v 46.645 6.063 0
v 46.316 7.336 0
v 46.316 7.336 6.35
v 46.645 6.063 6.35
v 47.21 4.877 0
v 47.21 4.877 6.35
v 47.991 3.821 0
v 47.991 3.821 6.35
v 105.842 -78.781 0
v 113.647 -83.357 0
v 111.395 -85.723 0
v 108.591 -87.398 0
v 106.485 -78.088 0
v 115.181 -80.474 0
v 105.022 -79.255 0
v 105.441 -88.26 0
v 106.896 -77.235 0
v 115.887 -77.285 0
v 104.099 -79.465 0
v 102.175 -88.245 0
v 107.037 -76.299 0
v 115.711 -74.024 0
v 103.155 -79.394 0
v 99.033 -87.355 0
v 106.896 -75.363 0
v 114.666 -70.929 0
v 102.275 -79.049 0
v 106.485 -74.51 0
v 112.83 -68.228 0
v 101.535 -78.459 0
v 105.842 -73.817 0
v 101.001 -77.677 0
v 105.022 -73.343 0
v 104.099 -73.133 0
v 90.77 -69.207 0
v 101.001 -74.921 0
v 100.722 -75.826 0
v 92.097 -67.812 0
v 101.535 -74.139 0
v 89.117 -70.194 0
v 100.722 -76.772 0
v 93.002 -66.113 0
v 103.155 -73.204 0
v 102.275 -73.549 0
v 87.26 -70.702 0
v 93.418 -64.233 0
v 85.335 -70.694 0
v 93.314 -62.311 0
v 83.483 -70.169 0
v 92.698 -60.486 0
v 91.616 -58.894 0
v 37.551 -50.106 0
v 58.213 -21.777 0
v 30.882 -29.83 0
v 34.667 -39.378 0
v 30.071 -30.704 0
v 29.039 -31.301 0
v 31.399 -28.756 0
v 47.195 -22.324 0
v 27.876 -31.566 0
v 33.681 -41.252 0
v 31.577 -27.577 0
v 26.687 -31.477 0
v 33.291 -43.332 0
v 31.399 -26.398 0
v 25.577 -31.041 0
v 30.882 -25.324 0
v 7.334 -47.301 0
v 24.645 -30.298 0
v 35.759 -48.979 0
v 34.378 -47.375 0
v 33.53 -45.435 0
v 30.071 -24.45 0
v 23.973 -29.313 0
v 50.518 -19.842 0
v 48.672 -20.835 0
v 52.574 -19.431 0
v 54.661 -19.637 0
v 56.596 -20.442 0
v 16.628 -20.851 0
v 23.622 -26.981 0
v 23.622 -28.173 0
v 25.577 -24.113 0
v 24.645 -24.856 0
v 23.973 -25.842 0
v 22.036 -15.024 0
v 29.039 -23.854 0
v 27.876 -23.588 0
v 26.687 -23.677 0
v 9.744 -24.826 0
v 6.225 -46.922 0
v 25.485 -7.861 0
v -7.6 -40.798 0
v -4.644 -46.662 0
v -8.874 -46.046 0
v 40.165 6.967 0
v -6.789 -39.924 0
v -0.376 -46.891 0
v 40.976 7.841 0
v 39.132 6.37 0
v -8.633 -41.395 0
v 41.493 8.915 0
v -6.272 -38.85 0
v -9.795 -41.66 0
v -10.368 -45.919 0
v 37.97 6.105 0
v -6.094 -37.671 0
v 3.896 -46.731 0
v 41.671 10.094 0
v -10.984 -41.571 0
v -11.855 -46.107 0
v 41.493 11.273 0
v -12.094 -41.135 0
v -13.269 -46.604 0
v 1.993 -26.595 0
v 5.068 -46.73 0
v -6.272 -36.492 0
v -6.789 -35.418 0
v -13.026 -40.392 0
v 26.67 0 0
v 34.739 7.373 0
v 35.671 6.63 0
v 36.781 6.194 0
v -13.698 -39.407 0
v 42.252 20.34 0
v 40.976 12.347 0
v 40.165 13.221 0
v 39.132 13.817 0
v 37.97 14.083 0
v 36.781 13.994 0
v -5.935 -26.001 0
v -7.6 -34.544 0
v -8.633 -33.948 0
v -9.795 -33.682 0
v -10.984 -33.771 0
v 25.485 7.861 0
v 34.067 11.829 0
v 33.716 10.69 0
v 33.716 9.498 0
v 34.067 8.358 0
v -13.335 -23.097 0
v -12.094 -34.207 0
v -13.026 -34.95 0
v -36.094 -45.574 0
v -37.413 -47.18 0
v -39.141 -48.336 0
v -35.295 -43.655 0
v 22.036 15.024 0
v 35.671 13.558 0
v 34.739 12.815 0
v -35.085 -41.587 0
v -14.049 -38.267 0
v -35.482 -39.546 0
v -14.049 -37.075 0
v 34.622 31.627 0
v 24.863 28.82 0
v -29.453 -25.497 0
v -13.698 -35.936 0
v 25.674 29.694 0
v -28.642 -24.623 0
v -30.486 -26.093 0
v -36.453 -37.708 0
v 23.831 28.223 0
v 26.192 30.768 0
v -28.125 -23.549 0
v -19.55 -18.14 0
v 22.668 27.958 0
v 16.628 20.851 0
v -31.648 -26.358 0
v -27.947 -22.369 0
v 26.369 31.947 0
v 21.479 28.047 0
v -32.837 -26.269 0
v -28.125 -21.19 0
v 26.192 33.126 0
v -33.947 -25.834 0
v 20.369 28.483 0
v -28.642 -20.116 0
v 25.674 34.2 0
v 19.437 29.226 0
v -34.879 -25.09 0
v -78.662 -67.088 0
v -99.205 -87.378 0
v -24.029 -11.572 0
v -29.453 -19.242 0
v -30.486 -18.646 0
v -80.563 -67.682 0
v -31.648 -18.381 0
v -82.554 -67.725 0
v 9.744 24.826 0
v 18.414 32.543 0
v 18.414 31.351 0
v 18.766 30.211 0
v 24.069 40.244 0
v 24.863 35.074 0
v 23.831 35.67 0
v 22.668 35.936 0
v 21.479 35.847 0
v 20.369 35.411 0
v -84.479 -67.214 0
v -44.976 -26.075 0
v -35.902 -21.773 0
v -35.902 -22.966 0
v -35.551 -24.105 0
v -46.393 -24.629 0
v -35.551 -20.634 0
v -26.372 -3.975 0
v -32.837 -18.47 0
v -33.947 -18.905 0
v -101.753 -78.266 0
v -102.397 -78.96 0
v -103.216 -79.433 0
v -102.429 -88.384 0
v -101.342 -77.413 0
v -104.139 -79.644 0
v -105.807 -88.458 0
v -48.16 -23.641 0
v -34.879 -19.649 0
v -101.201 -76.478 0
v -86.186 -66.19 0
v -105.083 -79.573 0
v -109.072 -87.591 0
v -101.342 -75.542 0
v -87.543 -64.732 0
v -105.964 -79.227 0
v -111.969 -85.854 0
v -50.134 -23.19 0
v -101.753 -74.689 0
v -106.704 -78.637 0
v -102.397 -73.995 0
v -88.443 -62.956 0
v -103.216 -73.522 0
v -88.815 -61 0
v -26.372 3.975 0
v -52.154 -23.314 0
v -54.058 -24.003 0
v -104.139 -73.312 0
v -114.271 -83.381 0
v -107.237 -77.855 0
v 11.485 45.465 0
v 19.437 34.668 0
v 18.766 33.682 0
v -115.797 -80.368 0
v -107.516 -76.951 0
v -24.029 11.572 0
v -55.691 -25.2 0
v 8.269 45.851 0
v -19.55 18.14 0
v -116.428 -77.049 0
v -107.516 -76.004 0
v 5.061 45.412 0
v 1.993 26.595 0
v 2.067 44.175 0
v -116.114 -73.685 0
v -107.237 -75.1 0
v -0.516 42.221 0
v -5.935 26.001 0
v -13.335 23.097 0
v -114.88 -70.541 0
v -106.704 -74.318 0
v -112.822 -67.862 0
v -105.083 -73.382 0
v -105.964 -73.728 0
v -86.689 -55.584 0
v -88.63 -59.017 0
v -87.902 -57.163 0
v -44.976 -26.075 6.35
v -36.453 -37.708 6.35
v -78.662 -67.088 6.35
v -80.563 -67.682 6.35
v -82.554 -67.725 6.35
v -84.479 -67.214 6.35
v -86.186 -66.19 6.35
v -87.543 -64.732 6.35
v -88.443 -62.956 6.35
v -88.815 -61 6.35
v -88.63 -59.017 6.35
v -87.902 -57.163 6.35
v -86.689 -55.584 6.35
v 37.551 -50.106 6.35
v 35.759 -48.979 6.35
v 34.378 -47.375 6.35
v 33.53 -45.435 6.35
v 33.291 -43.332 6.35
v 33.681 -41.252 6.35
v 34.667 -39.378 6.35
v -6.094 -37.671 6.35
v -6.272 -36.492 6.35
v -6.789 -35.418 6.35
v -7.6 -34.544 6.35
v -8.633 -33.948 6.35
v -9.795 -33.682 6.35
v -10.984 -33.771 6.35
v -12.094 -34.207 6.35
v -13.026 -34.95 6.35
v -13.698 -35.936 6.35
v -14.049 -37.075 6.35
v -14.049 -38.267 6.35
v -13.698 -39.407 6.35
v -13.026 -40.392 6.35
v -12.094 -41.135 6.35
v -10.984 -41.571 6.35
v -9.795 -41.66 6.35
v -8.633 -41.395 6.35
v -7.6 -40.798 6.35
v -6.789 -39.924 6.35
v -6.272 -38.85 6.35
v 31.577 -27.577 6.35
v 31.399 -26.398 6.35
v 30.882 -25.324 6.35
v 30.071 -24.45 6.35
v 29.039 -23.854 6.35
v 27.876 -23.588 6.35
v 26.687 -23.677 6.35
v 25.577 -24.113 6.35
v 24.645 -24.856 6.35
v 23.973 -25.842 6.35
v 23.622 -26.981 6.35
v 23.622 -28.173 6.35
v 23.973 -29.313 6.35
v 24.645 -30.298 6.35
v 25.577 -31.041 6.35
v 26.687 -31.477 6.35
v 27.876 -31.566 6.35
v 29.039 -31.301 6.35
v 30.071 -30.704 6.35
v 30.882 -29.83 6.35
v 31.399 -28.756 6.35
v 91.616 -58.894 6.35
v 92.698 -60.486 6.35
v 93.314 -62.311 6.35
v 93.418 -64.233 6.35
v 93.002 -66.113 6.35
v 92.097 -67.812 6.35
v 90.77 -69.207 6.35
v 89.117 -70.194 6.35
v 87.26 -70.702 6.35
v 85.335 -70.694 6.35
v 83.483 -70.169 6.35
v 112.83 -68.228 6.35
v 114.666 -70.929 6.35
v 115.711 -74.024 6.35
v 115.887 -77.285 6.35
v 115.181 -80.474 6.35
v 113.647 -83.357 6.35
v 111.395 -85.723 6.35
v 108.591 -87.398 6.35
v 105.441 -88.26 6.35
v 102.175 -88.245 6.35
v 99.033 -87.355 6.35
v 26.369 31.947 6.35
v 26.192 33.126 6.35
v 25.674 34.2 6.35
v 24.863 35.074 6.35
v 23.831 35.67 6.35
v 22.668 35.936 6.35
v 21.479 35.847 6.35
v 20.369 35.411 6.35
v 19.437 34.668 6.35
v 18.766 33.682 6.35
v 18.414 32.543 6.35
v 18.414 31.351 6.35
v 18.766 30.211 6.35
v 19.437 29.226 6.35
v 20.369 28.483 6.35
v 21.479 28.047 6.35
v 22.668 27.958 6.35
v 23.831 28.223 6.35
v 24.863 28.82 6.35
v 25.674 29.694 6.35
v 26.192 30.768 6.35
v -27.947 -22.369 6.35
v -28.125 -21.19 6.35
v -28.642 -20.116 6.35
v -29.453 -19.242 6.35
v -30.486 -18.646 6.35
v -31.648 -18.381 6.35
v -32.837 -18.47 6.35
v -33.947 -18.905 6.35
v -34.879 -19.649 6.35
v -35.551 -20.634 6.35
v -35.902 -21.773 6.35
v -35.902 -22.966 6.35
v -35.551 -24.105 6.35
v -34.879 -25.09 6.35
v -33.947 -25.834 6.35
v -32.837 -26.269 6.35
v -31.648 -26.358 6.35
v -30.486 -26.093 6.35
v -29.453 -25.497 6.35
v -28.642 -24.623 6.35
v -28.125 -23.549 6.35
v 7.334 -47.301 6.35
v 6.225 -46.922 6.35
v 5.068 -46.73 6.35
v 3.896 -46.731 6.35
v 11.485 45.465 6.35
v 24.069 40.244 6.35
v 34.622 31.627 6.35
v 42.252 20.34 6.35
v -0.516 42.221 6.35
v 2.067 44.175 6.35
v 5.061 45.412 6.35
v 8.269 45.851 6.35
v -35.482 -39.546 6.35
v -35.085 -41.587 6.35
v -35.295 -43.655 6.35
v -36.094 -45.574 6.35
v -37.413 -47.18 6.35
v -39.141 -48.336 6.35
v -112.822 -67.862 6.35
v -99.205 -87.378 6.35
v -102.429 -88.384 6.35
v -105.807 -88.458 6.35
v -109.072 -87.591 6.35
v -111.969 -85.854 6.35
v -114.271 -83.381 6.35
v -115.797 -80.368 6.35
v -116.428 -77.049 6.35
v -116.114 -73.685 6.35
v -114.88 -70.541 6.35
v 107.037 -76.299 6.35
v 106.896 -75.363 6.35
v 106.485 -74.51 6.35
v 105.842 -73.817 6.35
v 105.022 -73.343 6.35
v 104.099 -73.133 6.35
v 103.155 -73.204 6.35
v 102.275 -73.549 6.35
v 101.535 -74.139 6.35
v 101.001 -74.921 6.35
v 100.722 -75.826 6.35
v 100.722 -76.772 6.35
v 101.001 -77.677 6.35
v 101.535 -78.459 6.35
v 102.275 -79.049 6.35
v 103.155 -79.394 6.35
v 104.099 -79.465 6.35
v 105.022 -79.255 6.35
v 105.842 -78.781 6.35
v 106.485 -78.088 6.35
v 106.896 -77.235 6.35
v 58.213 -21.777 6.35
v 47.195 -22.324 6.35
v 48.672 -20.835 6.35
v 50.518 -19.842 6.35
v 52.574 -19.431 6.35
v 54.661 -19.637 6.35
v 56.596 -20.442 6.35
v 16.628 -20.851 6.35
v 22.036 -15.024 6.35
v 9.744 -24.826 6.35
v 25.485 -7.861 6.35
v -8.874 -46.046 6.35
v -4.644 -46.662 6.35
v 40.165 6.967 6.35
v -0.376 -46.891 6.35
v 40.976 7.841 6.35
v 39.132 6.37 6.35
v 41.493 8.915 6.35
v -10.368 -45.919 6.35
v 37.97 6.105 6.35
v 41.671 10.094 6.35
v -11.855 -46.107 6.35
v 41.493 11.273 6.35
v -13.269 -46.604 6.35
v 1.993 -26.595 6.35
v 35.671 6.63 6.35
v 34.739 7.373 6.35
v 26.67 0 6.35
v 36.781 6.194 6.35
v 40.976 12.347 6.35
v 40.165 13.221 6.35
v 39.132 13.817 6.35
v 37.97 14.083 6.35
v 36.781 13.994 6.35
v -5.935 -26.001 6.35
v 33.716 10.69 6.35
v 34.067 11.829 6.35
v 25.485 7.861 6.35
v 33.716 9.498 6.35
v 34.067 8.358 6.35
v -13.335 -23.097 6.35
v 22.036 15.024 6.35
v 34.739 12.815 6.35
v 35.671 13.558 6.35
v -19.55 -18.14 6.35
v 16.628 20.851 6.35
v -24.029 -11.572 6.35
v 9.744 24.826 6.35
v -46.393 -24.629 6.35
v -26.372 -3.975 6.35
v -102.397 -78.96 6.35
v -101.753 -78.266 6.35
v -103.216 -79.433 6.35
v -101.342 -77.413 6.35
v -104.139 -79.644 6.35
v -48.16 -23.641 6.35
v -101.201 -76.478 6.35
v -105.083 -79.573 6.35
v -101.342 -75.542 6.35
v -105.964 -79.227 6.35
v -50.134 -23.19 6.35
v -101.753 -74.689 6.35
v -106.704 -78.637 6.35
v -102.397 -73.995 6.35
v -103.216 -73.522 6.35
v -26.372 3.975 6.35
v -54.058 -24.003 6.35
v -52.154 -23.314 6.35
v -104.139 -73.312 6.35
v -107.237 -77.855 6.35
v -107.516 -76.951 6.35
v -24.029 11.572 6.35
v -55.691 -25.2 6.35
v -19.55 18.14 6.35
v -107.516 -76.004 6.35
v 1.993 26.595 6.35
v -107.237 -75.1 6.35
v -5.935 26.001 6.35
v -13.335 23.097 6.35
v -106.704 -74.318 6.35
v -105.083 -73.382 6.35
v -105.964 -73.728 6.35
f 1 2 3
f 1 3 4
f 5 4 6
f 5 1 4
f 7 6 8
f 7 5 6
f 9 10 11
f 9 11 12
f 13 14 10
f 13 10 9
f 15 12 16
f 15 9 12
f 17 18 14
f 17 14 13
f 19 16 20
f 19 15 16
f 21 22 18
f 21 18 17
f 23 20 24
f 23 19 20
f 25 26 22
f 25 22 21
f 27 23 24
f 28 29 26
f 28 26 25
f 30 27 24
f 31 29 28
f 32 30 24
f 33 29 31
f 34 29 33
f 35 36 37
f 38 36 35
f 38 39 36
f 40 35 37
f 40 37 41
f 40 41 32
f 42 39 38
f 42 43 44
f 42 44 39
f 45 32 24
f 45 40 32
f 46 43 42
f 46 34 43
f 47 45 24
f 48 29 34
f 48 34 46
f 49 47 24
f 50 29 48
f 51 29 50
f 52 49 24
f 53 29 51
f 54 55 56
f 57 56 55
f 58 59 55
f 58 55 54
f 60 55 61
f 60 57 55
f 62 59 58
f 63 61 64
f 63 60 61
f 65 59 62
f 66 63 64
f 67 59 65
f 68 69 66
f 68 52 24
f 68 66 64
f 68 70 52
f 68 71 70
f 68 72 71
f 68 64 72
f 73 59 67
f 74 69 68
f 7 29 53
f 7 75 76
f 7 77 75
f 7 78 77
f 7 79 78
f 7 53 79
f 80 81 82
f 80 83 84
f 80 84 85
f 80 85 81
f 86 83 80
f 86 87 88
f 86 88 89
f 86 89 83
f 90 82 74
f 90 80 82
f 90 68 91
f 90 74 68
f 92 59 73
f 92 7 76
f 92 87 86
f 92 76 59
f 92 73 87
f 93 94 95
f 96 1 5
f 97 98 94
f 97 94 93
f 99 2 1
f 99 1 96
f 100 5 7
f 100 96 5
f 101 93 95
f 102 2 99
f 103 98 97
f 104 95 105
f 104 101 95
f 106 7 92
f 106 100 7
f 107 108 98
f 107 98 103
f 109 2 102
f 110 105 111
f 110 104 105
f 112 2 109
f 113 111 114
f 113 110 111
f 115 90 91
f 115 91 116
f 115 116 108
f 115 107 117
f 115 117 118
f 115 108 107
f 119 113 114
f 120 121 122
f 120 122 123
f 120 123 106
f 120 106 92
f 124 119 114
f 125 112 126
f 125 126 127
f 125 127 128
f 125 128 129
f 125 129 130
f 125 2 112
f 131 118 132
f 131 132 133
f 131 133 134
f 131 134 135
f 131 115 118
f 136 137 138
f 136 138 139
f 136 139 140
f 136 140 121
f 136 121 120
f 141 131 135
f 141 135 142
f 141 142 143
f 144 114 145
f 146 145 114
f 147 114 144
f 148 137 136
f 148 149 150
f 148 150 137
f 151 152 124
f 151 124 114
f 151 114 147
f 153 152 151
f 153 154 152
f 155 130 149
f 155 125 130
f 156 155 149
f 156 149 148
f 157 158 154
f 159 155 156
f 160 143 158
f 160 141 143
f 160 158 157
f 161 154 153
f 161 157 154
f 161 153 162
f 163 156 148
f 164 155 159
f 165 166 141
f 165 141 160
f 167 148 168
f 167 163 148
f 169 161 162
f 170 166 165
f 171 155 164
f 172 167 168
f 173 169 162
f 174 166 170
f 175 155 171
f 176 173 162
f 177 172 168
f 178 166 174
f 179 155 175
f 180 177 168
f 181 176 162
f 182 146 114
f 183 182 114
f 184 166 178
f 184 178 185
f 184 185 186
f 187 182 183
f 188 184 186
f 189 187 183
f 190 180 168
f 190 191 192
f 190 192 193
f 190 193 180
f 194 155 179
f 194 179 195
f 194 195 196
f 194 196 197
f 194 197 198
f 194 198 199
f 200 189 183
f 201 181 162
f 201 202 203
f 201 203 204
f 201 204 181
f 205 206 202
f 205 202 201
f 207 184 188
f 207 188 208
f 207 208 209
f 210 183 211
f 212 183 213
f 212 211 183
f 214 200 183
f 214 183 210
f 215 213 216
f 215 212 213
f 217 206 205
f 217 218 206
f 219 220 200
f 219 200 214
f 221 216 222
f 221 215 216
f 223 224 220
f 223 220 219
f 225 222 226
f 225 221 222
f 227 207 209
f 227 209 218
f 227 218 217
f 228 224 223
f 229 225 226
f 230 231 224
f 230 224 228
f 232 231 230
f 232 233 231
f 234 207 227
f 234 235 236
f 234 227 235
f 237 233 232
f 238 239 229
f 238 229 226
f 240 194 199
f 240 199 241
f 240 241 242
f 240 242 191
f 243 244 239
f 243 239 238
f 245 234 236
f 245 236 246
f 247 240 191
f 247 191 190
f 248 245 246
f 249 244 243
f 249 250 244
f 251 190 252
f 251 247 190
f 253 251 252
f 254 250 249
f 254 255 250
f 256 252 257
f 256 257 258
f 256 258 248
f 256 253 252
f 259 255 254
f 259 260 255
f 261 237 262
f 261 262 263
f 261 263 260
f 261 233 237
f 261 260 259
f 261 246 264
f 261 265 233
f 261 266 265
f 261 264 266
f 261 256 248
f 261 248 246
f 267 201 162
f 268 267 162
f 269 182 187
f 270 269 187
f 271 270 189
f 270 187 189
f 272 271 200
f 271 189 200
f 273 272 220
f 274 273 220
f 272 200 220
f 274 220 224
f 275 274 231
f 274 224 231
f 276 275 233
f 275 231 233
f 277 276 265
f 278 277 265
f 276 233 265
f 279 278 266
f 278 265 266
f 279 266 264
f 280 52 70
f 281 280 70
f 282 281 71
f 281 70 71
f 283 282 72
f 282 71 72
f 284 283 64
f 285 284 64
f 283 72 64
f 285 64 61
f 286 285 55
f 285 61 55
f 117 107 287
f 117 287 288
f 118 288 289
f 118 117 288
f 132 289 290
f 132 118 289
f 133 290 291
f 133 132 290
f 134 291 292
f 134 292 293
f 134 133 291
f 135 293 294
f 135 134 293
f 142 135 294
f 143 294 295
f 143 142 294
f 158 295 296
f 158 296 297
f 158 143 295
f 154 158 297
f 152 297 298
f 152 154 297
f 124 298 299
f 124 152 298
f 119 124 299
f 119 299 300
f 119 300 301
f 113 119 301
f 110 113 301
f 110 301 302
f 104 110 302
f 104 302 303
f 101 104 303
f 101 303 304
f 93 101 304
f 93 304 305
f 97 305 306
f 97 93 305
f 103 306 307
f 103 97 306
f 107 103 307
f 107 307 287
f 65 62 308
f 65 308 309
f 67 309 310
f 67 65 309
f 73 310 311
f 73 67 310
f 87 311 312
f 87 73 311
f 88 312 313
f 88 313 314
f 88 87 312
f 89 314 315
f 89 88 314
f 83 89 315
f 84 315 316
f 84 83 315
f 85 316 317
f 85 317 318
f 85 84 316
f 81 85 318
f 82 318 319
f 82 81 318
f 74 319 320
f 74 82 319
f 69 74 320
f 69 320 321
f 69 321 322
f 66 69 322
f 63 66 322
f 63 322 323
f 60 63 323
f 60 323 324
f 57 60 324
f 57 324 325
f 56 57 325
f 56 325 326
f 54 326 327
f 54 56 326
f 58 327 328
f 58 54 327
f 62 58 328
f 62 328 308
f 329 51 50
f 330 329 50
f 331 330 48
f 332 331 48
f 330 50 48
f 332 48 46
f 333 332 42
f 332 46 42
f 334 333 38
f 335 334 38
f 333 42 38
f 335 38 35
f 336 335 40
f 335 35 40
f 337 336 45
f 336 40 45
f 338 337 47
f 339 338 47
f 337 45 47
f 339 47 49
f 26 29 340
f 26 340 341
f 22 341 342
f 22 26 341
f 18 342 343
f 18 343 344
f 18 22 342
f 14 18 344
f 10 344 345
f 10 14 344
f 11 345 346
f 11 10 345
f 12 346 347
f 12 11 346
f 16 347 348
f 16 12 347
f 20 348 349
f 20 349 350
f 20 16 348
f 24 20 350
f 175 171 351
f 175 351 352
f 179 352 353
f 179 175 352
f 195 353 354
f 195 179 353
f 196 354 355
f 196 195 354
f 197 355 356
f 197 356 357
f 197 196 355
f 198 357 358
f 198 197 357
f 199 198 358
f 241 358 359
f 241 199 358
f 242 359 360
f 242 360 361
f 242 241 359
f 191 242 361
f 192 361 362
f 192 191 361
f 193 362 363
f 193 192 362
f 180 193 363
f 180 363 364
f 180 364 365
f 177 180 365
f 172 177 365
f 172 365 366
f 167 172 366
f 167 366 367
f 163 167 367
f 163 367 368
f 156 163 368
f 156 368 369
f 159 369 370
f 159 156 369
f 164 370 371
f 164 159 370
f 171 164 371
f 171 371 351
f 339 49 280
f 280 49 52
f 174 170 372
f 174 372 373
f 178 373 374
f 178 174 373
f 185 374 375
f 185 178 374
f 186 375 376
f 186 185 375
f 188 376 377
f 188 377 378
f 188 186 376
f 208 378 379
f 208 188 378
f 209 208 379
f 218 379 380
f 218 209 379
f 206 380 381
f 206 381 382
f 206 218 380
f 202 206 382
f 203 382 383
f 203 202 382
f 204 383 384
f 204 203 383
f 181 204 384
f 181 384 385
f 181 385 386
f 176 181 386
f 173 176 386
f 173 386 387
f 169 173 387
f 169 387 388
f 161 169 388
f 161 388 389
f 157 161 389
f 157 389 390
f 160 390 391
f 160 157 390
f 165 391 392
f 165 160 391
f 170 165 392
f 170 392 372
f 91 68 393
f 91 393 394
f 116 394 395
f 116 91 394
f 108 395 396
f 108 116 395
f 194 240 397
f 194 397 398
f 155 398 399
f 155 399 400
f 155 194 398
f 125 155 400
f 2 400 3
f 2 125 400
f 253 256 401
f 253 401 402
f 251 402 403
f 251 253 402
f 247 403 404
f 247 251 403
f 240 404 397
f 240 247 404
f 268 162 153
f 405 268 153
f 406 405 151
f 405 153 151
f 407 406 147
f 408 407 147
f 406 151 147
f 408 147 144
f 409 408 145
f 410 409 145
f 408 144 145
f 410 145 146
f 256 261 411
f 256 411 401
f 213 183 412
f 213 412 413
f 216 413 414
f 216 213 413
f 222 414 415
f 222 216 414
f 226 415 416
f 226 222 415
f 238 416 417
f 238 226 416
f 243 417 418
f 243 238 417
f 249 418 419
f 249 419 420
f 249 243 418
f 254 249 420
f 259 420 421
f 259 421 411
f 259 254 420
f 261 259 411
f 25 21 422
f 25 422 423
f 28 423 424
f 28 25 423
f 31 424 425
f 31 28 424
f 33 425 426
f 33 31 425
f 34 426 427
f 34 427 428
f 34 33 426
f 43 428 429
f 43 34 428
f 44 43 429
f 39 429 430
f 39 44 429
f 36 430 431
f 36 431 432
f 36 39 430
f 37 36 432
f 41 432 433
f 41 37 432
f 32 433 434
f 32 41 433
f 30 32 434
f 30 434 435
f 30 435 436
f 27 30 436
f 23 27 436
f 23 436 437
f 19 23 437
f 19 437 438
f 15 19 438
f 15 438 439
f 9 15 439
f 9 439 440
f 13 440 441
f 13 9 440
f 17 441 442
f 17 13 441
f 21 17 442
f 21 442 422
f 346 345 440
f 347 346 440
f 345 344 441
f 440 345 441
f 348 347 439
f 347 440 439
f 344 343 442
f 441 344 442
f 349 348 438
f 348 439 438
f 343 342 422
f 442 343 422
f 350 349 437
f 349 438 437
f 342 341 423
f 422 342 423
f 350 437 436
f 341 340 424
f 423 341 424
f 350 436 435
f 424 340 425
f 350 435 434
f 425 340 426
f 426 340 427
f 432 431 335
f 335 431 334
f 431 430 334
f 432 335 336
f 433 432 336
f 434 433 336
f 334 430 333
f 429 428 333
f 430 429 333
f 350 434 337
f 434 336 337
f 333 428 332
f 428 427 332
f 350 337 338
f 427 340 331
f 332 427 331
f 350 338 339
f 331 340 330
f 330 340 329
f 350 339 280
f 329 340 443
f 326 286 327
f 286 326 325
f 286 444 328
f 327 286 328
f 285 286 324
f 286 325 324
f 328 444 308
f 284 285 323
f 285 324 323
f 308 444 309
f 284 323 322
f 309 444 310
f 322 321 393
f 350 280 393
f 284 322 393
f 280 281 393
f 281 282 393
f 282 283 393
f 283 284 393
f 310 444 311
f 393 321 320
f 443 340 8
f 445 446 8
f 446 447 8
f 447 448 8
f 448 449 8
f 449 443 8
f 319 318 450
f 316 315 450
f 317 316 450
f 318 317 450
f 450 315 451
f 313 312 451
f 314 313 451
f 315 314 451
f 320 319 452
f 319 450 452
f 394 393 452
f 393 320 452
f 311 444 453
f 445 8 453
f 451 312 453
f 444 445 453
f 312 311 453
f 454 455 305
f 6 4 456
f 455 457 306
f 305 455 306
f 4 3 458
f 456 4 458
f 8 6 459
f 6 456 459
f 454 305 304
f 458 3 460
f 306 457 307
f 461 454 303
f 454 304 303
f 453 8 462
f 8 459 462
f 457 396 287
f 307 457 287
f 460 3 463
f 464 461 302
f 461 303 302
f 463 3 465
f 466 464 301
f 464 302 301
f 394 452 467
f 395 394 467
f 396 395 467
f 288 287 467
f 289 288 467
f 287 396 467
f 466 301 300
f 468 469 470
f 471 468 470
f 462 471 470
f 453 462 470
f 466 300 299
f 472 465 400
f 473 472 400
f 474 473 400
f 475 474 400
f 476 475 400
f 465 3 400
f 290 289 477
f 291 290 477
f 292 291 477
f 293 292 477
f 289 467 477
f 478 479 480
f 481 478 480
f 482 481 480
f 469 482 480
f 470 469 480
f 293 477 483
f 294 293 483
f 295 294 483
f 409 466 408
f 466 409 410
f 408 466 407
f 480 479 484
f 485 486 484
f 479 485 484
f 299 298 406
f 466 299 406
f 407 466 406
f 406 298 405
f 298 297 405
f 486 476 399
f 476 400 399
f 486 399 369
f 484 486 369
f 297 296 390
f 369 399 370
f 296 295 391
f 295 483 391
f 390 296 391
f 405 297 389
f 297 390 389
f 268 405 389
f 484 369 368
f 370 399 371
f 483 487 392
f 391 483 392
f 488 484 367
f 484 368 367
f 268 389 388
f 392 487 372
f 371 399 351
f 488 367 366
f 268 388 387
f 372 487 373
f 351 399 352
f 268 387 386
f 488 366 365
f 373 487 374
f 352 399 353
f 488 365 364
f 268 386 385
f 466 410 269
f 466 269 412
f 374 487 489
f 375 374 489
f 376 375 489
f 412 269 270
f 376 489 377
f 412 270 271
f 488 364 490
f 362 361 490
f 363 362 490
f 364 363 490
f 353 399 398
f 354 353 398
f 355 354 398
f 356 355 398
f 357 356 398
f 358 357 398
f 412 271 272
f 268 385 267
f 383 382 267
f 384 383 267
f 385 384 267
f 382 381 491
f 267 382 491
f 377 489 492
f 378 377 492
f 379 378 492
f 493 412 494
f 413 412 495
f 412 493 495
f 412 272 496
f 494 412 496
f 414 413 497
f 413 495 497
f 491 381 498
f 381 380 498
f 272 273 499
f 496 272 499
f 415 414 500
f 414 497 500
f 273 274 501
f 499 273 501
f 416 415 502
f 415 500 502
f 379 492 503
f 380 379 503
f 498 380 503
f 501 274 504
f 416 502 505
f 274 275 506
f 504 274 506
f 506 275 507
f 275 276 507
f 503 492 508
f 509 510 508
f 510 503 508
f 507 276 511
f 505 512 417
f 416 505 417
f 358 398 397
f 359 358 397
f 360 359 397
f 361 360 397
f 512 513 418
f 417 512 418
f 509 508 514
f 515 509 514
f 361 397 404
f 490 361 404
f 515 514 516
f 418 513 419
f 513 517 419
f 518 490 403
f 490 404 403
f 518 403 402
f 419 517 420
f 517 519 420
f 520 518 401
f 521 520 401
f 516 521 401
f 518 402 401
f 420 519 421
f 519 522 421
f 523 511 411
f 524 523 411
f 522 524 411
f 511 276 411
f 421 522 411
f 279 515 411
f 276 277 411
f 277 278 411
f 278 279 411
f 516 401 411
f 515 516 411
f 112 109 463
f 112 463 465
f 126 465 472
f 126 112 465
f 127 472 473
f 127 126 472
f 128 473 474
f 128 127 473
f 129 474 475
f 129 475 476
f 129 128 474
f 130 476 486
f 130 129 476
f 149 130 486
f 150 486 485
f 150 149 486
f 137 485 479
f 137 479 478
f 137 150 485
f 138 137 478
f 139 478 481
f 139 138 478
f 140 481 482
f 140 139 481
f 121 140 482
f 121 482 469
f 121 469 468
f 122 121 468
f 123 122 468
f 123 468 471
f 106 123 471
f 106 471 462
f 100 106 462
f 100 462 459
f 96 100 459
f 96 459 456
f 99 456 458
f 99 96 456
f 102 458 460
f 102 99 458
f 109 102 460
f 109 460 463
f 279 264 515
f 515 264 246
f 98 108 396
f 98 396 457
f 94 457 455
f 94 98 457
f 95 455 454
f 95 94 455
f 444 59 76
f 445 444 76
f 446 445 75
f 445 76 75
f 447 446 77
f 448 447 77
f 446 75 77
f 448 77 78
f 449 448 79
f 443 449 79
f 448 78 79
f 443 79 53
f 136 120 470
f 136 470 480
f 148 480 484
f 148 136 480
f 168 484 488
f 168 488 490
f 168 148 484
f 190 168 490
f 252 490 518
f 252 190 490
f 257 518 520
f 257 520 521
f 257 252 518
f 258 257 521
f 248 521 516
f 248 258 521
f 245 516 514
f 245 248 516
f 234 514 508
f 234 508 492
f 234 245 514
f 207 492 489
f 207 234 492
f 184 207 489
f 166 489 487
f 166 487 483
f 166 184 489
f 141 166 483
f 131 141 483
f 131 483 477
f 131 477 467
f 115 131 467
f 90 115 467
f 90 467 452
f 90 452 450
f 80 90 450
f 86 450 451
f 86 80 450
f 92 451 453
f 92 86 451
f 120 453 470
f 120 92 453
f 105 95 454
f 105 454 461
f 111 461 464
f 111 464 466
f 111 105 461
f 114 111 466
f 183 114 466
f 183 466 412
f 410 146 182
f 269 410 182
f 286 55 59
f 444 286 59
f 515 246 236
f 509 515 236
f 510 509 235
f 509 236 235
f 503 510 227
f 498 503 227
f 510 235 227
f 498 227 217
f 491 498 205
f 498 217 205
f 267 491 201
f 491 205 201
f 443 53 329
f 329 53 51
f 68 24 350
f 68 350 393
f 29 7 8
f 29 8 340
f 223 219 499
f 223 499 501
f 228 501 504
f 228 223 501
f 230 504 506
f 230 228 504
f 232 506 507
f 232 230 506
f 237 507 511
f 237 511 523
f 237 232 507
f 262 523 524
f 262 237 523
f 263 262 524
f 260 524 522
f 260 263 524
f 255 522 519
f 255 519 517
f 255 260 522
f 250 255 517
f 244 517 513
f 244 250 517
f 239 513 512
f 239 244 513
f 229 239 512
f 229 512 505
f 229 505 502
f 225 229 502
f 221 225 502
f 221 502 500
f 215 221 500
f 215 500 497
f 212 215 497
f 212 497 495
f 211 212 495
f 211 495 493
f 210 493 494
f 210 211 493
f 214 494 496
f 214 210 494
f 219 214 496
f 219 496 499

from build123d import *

# Parameters (mm, degrees)
SKETCH4_R           = 26.67
SKETCH4_R_2         = 3.175
SKETCH4_R_3         = 4
BOSS_EXTRUDE1_DEPTH = 6.35


with BuildPart() as part:
    # Sketch4 → Boss-Extrude1 (new body)
    with BuildSketch(Plane.XY):
        with BuildLine():
            Line((-112.821947343, -67.861519054), (-0.515655425, 42.221127865))
            ThreePointArc((-0.515655425, 42.221127865), (5.060574998, 45.411581565), (11.484788098, 45.464747253))
            ThreePointArc((11.484788098, 45.464747253), (34.621914338, 31.626992395), (46.315565637, 7.335664942))
            ThreePointArc((46.315565637, 7.335664942), (46.8988099, 5.456870428), (47.991424982, 3.820950204))
            Line((47.991424982, 3.820950204), (112.830192448, -68.228316343))
            ThreePointArc((112.830192448, -68.228316343), (113.646801884, -83.357459106), (99.032580967, -87.355253332))
            Line((99.032580967, -87.355253332), (7.333742713, -47.300802353))
            ThreePointArc((7.333742713, -47.300802353), (5.650340933, -46.801981002), (3.896034016, -46.730766304))
            ThreePointArc((3.896034016, -46.730766304), (-2.51262623, -46.825530534), (-8.874346459, -46.045516343))
            ThreePointArc((-8.874346459, -46.045516343), (-11.116219354, -45.973658852), (-13.268973959, -46.603583598))
            Line((-13.268973959, -46.603583598), (-99.204524399, -87.377892758))
            ThreePointArc((-99.204524399, -87.377892758), (-114.270940187, -83.381465438), (-112.821947343, -67.861519054))
        make_face()
        Circle(SKETCH4_R, mode=Mode.SUBTRACT)
        with Locations((103.862003689, -76.298992609)):
            Circle(SKETCH4_R_2, mode=Mode.SUBTRACT)
        with Locations((-104.376429258, -76.477634727)):
            Circle(SKETCH4_R_2, mode=Mode.SUBTRACT)
        with Locations((-10.093942759, -37.671107225)):
            Circle(SKETCH4_R_3, mode=Mode.SUBTRACT)
        with Locations((-31.946929727, -22.369481018)):
            Circle(SKETCH4_R_3, mode=Mode.SUBTRACT)
        with Locations((27.577164466, -27.577164466)):
            Circle(SKETCH4_R_3, mode=Mode.SUBTRACT)
        with Locations((37.671107225, 10.093942759)):
            Circle(SKETCH4_R_3, mode=Mode.SUBTRACT)
        with Locations((22.369481018, 31.946929727)):
            Circle(SKETCH4_R_3, mode=Mode.SUBTRACT)
        with BuildLine():
            Line((-86.689084945, -55.583778017), (-55.691219904, -25.199665298))
            ThreePointArc((-55.691219904, -25.199665298), (-50.133633158, -23.190261002), (-44.975951587, -26.075186805))
            Line((-44.975951587, -26.075186805), (-36.452805068, -37.70754969))
            ThreePointArc((-36.452805068, -37.70754969), (-35.294757483, -43.654797982), (-39.140960913, -48.336416892))
            Line((-39.140960913, -48.336416892), (-78.661972473, -67.088166726))
            ThreePointArc((-78.661972473, -67.088166726), (-87.543228095, -64.73237799), (-86.689084945, -55.583778017))
        make_face(mode=Mode.SUBTRACT)
        with BuildLine():
            Line((34.66659199, -39.378036032), (47.195108172, -22.323593379))
            ThreePointArc((47.195108172, -22.323593379), (52.574176498, -19.430906367), (58.213255891, -21.776710666))
            Line((58.213255891, -21.776710666), (91.616099201, -58.894170716))
            ThreePointArc((91.616099201, -58.894170716), (92.097468974, -67.812402239), (83.482770328, -70.16899673))
            Line((83.482770328, -70.16899673), (37.551410836, -50.105979333))
            ThreePointArc((37.551410836, -50.105979333), (33.530211234, -45.435462365), (34.66659199, -39.378036032))
        make_face(mode=Mode.SUBTRACT)
    extrude(amount=BOSS_EXTRUDE1_DEPTH)


solid = part.part
